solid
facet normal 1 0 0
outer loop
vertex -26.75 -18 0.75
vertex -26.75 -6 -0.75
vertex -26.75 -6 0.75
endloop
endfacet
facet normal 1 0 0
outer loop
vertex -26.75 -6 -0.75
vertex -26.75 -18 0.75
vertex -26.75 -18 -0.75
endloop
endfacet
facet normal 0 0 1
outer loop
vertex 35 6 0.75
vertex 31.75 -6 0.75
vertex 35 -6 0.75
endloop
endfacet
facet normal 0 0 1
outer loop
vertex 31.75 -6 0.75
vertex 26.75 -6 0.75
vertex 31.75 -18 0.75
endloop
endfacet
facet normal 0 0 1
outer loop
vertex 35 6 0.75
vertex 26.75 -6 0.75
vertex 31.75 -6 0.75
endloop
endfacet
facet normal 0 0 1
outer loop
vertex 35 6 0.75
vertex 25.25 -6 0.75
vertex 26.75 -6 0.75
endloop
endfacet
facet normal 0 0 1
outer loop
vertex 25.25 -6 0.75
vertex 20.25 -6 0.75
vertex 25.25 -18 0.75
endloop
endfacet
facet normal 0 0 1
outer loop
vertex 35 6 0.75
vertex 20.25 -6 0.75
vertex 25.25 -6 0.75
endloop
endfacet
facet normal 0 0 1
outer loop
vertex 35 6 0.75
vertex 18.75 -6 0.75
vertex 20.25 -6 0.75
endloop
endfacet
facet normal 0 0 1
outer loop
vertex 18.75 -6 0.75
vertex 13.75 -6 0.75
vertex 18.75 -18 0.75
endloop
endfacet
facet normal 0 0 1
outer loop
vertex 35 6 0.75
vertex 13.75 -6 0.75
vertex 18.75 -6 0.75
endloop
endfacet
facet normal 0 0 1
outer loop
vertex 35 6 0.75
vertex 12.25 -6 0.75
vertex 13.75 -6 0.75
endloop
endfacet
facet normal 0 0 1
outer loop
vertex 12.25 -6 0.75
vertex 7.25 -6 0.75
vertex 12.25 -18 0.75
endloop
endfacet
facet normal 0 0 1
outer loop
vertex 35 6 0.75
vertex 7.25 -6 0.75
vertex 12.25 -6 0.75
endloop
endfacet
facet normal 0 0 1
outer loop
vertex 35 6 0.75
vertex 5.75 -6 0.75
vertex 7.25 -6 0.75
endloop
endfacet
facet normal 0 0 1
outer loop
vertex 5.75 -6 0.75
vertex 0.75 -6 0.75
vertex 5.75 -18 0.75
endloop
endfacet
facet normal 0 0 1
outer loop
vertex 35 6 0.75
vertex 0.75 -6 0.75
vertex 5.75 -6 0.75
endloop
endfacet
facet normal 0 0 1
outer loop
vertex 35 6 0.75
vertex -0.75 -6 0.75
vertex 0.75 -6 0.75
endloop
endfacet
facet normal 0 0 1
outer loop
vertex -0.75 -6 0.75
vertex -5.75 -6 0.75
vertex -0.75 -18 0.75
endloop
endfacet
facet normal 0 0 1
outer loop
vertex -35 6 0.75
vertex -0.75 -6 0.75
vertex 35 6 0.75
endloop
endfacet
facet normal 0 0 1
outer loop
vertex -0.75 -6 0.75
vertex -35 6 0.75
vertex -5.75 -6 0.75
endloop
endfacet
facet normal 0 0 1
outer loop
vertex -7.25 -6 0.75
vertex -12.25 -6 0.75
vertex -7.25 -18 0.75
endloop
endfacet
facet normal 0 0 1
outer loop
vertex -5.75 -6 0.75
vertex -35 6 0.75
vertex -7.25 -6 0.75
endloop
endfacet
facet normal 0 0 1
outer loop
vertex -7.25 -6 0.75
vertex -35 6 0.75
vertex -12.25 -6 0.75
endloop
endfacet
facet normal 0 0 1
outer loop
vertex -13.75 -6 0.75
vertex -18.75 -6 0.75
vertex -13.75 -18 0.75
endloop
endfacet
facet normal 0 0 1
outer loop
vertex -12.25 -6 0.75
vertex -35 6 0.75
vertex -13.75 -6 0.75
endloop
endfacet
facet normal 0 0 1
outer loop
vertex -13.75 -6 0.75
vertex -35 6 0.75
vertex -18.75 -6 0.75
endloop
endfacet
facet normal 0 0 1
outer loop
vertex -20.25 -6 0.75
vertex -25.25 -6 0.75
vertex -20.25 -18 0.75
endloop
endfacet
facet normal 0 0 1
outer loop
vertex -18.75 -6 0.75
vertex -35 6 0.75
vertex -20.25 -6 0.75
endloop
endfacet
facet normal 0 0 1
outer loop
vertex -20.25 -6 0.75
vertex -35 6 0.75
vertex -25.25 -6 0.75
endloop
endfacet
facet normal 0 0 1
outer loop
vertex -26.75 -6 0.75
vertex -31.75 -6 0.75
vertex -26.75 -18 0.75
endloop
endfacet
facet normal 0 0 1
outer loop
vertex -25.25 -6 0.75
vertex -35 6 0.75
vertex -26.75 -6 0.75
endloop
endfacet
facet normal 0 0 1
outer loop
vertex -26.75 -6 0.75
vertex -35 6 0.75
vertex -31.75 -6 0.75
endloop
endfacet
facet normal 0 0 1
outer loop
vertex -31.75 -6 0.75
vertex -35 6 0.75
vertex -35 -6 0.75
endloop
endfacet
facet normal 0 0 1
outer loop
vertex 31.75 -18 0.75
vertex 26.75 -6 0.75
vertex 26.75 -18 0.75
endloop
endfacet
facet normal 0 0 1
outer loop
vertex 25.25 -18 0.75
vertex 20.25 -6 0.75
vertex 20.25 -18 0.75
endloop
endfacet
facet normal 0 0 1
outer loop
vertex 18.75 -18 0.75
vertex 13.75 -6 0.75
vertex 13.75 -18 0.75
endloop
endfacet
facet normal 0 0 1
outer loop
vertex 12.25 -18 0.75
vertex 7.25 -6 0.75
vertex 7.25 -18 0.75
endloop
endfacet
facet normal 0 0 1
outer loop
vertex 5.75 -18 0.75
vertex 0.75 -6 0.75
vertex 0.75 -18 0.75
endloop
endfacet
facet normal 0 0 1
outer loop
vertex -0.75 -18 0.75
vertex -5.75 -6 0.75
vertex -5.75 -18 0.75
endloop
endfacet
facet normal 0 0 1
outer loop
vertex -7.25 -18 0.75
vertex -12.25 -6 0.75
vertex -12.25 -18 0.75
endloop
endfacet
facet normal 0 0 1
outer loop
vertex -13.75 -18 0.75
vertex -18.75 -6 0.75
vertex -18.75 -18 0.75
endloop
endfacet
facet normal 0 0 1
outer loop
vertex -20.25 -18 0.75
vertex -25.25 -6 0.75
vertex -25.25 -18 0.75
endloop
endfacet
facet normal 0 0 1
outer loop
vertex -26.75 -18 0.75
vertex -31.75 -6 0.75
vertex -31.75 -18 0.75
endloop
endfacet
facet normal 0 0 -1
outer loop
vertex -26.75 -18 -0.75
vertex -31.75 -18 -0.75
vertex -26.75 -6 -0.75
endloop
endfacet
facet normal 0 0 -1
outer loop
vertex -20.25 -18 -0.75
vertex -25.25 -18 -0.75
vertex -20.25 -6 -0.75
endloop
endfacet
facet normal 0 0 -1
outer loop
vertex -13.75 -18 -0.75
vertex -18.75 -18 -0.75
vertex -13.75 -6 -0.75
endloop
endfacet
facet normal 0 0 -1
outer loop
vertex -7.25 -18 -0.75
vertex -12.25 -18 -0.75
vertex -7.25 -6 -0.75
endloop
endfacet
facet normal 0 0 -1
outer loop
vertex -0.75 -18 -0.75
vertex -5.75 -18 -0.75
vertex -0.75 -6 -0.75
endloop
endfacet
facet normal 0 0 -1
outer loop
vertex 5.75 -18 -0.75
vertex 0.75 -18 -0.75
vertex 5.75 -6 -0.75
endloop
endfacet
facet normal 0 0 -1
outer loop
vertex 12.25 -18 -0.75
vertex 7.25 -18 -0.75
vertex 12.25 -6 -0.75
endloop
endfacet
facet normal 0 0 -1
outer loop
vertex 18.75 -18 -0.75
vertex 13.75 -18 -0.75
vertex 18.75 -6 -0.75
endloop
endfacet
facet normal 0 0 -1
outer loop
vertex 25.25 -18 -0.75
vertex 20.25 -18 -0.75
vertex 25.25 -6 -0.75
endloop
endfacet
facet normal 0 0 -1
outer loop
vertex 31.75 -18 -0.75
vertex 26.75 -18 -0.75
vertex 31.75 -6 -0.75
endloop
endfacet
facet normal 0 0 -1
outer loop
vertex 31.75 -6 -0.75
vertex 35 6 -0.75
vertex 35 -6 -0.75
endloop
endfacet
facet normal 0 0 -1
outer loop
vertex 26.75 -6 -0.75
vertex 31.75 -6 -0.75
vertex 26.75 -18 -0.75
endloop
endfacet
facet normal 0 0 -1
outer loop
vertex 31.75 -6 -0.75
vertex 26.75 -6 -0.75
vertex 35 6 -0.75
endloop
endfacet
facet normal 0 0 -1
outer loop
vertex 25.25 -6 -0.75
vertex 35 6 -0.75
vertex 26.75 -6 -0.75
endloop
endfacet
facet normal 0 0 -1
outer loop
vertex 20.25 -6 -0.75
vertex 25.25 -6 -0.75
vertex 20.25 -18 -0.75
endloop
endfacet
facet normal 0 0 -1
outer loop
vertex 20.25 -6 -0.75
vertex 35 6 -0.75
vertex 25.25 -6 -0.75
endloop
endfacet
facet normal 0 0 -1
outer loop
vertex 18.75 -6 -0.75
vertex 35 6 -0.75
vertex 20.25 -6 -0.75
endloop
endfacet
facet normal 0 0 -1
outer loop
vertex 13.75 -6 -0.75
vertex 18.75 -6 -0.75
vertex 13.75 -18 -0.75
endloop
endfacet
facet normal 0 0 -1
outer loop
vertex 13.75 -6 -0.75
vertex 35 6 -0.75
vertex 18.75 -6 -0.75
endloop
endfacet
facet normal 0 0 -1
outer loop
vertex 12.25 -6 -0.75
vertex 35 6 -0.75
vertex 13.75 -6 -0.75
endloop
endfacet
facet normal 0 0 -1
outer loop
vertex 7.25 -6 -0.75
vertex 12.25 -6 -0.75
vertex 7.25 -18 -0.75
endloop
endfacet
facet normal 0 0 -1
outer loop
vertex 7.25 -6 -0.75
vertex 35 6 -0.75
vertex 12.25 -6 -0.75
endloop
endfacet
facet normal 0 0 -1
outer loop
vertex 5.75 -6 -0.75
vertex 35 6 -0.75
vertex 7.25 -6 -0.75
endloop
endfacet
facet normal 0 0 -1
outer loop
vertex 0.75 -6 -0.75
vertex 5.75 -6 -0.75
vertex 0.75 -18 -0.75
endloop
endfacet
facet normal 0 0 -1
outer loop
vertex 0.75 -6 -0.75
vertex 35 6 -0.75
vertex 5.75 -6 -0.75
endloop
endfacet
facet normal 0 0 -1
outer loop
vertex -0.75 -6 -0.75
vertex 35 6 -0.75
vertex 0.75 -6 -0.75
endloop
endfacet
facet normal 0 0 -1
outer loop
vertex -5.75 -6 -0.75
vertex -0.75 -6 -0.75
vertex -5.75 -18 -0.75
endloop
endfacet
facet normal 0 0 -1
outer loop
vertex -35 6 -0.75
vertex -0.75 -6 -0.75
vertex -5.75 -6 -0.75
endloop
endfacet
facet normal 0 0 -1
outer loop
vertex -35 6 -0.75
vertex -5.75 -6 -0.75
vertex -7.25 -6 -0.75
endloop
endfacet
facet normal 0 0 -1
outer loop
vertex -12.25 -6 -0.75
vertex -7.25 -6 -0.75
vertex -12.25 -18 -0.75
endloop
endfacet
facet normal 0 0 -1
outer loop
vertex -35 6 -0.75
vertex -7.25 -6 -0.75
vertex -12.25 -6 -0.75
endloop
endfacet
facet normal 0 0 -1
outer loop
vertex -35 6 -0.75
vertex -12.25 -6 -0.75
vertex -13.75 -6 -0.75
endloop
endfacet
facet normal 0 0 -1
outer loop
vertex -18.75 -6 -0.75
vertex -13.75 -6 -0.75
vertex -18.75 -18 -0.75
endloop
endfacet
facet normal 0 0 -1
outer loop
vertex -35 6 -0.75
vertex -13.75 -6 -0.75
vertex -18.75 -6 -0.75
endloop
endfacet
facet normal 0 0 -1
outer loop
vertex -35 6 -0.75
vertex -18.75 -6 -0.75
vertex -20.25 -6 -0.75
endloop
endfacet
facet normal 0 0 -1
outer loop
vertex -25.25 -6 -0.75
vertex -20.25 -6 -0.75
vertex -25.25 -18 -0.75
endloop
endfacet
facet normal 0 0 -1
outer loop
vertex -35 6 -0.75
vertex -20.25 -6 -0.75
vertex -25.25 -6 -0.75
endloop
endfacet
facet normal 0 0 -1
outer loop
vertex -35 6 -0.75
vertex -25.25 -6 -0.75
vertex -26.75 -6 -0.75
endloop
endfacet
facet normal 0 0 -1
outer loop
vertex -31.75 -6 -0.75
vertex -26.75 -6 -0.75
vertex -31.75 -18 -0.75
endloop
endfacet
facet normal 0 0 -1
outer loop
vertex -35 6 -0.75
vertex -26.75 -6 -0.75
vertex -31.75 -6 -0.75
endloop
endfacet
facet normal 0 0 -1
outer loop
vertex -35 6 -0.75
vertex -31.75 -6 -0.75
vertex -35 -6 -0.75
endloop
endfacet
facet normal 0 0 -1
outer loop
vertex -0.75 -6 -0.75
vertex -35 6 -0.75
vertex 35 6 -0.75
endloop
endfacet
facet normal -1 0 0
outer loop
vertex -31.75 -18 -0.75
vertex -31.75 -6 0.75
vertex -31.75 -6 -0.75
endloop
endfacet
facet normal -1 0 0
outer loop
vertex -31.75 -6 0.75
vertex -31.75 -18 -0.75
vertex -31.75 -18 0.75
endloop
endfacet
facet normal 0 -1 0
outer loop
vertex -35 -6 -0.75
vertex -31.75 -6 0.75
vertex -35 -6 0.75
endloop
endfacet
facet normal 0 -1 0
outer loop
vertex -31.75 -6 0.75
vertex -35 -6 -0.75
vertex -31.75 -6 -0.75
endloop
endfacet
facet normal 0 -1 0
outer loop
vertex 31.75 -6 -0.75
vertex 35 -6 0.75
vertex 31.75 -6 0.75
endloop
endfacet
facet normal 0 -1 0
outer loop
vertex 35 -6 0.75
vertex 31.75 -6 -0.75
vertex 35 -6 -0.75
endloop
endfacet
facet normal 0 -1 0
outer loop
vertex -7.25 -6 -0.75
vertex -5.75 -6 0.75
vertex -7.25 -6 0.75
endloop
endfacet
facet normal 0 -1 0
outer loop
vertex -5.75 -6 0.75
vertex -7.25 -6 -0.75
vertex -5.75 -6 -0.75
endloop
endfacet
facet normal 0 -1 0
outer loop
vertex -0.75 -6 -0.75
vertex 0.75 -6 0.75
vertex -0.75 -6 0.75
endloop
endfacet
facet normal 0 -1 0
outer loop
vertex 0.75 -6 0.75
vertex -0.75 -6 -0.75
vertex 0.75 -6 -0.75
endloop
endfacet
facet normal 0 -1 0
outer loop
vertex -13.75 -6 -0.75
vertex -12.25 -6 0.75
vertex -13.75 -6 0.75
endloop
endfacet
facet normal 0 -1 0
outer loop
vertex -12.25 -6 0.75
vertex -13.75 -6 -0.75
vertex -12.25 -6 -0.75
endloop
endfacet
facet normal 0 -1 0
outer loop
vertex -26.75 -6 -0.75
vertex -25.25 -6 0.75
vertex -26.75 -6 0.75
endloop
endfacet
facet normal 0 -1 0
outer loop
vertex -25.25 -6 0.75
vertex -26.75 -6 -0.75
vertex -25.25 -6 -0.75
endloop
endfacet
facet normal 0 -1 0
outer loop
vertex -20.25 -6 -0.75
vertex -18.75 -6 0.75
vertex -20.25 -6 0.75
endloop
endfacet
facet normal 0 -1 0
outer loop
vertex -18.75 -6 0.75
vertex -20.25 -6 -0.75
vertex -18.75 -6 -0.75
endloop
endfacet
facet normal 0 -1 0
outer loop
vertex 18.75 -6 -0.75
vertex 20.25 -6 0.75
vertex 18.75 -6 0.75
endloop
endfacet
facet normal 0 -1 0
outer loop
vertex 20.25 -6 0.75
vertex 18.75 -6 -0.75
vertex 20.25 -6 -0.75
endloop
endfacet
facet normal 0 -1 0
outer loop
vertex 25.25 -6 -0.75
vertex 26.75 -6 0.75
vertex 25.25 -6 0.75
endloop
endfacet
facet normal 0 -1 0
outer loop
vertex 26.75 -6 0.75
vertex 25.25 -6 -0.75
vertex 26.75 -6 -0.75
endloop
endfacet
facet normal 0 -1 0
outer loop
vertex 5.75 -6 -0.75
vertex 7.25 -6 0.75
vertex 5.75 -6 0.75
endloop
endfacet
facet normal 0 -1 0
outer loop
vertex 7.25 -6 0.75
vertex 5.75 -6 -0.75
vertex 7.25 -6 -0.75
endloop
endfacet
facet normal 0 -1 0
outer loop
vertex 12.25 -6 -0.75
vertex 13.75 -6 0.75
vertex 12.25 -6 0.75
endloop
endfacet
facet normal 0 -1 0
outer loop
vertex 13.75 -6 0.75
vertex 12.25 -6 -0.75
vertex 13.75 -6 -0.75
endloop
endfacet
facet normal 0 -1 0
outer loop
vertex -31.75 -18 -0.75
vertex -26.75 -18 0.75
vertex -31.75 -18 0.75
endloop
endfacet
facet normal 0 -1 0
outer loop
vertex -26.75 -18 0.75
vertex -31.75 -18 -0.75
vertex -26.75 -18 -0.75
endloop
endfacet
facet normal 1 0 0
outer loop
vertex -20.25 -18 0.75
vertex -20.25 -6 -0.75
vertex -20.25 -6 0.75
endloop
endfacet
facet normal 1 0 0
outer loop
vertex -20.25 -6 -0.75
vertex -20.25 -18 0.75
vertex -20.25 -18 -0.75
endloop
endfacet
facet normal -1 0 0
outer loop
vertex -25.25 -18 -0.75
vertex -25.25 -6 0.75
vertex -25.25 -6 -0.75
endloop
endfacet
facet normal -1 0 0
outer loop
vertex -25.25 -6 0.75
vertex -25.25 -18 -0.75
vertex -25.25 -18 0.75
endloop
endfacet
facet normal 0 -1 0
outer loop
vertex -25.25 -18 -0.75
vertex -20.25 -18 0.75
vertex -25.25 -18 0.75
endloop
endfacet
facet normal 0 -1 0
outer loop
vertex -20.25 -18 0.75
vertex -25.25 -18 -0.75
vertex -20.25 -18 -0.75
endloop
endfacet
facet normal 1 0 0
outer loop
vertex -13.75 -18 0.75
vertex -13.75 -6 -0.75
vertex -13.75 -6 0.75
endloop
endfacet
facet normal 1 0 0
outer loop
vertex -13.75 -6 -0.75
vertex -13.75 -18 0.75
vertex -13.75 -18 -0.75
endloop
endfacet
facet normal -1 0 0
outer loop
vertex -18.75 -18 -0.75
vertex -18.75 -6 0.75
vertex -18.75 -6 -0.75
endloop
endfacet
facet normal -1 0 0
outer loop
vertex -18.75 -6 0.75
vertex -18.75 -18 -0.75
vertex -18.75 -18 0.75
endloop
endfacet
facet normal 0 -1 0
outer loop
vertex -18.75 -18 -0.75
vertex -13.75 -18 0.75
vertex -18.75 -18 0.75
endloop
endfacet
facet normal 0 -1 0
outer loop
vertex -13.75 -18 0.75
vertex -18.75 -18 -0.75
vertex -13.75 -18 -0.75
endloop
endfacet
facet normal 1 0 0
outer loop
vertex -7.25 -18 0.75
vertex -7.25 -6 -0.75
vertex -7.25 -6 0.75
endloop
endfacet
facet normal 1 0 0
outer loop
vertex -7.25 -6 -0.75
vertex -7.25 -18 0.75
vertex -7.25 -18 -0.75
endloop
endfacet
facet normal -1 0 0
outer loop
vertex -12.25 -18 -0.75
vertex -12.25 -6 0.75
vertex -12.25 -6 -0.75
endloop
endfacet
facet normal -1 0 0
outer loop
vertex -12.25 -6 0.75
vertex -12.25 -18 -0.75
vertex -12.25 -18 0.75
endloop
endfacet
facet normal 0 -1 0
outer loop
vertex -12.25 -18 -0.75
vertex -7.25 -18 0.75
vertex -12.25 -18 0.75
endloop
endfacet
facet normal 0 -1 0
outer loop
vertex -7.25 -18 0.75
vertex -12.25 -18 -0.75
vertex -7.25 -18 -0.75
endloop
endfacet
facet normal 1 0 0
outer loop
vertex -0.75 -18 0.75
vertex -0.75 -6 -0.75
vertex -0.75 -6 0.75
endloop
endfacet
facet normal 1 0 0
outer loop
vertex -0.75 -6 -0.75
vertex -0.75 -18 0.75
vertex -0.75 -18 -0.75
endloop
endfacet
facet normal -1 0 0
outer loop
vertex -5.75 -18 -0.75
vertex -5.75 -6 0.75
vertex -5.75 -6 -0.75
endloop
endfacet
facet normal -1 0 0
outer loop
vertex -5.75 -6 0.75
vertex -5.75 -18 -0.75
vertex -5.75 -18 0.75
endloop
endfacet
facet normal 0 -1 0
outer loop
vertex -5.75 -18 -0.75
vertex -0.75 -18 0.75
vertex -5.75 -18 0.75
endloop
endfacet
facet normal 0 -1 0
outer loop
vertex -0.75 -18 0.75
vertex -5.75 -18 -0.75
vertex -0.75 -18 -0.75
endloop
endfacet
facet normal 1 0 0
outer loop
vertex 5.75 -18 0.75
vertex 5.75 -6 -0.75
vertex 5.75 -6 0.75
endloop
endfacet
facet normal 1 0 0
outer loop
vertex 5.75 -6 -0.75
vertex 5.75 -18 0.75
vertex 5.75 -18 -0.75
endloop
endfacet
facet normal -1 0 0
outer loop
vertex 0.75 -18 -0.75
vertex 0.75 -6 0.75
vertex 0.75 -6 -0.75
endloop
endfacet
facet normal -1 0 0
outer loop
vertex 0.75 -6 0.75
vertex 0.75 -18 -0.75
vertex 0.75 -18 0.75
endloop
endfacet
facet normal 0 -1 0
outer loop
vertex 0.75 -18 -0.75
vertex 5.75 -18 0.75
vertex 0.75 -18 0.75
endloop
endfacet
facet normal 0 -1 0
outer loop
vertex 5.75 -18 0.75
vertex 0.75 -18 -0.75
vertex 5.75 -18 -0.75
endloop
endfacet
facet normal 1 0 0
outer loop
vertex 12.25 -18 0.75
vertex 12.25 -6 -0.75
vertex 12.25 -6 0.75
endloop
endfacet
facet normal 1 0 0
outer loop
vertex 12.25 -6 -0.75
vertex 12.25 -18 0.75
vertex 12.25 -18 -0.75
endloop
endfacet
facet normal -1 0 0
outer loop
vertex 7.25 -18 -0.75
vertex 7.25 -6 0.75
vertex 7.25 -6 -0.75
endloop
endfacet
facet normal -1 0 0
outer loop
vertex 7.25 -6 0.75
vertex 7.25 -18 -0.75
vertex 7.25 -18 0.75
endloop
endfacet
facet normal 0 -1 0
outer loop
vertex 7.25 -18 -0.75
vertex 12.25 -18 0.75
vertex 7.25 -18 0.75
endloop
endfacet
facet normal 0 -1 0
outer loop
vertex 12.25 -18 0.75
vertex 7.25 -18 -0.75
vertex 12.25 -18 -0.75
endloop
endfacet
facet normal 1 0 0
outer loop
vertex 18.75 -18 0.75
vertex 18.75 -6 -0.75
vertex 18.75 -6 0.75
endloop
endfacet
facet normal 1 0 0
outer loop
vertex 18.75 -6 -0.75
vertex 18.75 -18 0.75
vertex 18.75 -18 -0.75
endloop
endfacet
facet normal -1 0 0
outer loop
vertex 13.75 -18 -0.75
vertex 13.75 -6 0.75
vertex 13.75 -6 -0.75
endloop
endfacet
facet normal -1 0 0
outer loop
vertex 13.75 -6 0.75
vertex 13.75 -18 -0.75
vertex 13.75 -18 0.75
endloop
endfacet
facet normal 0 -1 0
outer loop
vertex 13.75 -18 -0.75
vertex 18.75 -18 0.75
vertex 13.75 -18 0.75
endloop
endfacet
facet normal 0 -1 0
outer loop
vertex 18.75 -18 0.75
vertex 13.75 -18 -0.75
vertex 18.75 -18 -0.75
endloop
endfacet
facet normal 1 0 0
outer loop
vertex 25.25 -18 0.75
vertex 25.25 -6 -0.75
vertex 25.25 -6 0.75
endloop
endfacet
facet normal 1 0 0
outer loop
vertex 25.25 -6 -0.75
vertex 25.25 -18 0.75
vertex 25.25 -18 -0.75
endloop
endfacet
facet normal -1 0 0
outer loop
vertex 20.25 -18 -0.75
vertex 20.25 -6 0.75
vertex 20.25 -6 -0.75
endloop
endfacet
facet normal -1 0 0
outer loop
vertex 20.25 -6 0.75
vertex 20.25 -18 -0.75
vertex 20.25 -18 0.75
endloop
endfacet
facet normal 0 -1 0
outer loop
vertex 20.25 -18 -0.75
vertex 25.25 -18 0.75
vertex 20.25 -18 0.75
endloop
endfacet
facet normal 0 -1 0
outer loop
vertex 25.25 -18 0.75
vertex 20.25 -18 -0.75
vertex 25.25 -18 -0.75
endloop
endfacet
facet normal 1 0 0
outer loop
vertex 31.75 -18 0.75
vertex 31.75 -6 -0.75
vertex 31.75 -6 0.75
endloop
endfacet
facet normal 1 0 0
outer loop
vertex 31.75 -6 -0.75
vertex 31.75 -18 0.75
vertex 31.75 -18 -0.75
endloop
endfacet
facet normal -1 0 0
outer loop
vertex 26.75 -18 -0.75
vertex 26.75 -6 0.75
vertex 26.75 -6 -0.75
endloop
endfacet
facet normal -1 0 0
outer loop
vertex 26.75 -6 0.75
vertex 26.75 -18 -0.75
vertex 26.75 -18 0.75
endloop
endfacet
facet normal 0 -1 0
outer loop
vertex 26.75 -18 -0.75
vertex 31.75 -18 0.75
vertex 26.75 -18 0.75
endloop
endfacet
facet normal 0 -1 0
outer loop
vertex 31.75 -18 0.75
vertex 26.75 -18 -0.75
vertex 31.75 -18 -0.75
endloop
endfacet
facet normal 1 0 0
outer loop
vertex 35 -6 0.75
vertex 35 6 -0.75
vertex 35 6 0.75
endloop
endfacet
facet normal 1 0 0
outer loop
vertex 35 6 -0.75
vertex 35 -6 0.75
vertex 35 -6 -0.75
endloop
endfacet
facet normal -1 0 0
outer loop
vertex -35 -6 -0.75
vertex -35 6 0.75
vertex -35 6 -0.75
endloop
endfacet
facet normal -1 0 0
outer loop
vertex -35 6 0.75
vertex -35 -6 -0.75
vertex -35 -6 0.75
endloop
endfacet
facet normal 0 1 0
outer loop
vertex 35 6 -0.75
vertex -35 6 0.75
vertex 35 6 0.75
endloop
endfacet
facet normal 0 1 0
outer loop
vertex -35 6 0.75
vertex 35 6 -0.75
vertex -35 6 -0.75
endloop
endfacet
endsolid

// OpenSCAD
// 10-well Agarose Gel Comb
// Designed for FDM printing, lying flat on the build plate.

// --- Dimensions (measured with calipers) ---
plate_thickness = 1.5;   // Z height of the entire comb
spine_length = 70;       // X length of the back bar
spine_width = 12;        // Y width of the back bar
tooth_width = 5.0;       // X width of each tooth
tooth_length = 12;       // Y length of each tooth (extends in -Y)
num_teeth = 10;          // Number of wells/teeth
gap_between_teeth = 1.5; // Y gap between adjacent teeth

// --- Derived Calculations ---
// Total width occupied by teeth and gaps
total_tooth_row_width = (num_teeth * tooth_width) + ((num_teeth - 1) * gap_between_teeth);
// Start position of the first tooth in Y (relative to spine center)
// The spine is centered at Y=0. The teeth hang in -Y.
// We need to center the row of teeth on the spine.
// The row extends from Y_start to Y_end.
// Y_end (tip of teeth) = -tooth_length
// Y_start (base of teeth, attached to spine) = 0 (since they hang from the edge)
// Wait, the teeth hang from one long edge. Let's attach them to Y = -spine_width/2.
// So the teeth extend from Y = -spine_width/2 to Y = -spine_width/2 - tooth_length.
// The row of teeth is centered on the spine in X.
// The spine is centered at X=0.
// The row of teeth spans X from -total_tooth_row_width/2 to +total_tooth_row_width/2.

// --- Main Construction ---
$fn = 64;

union() {
    // 1. The Spine (Back Bar)
    // Centered at origin, lying flat.
    translate([0, 0, 0])
    cube([spine_length, spine_width, plate_thickness], center = true);

    // 2. The Teeth
    // Attached to the -Y edge of the spine.
    // The spine's -Y edge is at Y = -spine_width/2.
    // The teeth extend further in -Y.
    
    for (i = [0 : num_teeth - 1]) {
        // Calculate X position for each tooth
        // The row is centered at X=0.
        // The first tooth (i=0) is at the left-most position.
        // Left-most X = -total_tooth_row_width/2
        // Each subsequent tooth is offset by (tooth_width + gap_between_teeth)
        
        x_offset = -total_tooth_row_width/2 + i * (tooth_width + gap_between_teeth) + tooth_width/2;
        
        // Y position:
        // The base of the tooth is at Y = -spine_width/2.
        // The tooth extends in -Y direction by tooth_length.
        // So the tooth spans Y from -spine_width/2 to -spine_width/2 - tooth_length.
        // Center of the tooth in Y is -spine_width/2 - tooth_length/2.
        
        y_center = -spine_width/2 - tooth_length/2;
        
        translate([x_offset, y_center, 0])
        cube([tooth_width, tooth_length, plate_thickness], center = true);
    }
}
